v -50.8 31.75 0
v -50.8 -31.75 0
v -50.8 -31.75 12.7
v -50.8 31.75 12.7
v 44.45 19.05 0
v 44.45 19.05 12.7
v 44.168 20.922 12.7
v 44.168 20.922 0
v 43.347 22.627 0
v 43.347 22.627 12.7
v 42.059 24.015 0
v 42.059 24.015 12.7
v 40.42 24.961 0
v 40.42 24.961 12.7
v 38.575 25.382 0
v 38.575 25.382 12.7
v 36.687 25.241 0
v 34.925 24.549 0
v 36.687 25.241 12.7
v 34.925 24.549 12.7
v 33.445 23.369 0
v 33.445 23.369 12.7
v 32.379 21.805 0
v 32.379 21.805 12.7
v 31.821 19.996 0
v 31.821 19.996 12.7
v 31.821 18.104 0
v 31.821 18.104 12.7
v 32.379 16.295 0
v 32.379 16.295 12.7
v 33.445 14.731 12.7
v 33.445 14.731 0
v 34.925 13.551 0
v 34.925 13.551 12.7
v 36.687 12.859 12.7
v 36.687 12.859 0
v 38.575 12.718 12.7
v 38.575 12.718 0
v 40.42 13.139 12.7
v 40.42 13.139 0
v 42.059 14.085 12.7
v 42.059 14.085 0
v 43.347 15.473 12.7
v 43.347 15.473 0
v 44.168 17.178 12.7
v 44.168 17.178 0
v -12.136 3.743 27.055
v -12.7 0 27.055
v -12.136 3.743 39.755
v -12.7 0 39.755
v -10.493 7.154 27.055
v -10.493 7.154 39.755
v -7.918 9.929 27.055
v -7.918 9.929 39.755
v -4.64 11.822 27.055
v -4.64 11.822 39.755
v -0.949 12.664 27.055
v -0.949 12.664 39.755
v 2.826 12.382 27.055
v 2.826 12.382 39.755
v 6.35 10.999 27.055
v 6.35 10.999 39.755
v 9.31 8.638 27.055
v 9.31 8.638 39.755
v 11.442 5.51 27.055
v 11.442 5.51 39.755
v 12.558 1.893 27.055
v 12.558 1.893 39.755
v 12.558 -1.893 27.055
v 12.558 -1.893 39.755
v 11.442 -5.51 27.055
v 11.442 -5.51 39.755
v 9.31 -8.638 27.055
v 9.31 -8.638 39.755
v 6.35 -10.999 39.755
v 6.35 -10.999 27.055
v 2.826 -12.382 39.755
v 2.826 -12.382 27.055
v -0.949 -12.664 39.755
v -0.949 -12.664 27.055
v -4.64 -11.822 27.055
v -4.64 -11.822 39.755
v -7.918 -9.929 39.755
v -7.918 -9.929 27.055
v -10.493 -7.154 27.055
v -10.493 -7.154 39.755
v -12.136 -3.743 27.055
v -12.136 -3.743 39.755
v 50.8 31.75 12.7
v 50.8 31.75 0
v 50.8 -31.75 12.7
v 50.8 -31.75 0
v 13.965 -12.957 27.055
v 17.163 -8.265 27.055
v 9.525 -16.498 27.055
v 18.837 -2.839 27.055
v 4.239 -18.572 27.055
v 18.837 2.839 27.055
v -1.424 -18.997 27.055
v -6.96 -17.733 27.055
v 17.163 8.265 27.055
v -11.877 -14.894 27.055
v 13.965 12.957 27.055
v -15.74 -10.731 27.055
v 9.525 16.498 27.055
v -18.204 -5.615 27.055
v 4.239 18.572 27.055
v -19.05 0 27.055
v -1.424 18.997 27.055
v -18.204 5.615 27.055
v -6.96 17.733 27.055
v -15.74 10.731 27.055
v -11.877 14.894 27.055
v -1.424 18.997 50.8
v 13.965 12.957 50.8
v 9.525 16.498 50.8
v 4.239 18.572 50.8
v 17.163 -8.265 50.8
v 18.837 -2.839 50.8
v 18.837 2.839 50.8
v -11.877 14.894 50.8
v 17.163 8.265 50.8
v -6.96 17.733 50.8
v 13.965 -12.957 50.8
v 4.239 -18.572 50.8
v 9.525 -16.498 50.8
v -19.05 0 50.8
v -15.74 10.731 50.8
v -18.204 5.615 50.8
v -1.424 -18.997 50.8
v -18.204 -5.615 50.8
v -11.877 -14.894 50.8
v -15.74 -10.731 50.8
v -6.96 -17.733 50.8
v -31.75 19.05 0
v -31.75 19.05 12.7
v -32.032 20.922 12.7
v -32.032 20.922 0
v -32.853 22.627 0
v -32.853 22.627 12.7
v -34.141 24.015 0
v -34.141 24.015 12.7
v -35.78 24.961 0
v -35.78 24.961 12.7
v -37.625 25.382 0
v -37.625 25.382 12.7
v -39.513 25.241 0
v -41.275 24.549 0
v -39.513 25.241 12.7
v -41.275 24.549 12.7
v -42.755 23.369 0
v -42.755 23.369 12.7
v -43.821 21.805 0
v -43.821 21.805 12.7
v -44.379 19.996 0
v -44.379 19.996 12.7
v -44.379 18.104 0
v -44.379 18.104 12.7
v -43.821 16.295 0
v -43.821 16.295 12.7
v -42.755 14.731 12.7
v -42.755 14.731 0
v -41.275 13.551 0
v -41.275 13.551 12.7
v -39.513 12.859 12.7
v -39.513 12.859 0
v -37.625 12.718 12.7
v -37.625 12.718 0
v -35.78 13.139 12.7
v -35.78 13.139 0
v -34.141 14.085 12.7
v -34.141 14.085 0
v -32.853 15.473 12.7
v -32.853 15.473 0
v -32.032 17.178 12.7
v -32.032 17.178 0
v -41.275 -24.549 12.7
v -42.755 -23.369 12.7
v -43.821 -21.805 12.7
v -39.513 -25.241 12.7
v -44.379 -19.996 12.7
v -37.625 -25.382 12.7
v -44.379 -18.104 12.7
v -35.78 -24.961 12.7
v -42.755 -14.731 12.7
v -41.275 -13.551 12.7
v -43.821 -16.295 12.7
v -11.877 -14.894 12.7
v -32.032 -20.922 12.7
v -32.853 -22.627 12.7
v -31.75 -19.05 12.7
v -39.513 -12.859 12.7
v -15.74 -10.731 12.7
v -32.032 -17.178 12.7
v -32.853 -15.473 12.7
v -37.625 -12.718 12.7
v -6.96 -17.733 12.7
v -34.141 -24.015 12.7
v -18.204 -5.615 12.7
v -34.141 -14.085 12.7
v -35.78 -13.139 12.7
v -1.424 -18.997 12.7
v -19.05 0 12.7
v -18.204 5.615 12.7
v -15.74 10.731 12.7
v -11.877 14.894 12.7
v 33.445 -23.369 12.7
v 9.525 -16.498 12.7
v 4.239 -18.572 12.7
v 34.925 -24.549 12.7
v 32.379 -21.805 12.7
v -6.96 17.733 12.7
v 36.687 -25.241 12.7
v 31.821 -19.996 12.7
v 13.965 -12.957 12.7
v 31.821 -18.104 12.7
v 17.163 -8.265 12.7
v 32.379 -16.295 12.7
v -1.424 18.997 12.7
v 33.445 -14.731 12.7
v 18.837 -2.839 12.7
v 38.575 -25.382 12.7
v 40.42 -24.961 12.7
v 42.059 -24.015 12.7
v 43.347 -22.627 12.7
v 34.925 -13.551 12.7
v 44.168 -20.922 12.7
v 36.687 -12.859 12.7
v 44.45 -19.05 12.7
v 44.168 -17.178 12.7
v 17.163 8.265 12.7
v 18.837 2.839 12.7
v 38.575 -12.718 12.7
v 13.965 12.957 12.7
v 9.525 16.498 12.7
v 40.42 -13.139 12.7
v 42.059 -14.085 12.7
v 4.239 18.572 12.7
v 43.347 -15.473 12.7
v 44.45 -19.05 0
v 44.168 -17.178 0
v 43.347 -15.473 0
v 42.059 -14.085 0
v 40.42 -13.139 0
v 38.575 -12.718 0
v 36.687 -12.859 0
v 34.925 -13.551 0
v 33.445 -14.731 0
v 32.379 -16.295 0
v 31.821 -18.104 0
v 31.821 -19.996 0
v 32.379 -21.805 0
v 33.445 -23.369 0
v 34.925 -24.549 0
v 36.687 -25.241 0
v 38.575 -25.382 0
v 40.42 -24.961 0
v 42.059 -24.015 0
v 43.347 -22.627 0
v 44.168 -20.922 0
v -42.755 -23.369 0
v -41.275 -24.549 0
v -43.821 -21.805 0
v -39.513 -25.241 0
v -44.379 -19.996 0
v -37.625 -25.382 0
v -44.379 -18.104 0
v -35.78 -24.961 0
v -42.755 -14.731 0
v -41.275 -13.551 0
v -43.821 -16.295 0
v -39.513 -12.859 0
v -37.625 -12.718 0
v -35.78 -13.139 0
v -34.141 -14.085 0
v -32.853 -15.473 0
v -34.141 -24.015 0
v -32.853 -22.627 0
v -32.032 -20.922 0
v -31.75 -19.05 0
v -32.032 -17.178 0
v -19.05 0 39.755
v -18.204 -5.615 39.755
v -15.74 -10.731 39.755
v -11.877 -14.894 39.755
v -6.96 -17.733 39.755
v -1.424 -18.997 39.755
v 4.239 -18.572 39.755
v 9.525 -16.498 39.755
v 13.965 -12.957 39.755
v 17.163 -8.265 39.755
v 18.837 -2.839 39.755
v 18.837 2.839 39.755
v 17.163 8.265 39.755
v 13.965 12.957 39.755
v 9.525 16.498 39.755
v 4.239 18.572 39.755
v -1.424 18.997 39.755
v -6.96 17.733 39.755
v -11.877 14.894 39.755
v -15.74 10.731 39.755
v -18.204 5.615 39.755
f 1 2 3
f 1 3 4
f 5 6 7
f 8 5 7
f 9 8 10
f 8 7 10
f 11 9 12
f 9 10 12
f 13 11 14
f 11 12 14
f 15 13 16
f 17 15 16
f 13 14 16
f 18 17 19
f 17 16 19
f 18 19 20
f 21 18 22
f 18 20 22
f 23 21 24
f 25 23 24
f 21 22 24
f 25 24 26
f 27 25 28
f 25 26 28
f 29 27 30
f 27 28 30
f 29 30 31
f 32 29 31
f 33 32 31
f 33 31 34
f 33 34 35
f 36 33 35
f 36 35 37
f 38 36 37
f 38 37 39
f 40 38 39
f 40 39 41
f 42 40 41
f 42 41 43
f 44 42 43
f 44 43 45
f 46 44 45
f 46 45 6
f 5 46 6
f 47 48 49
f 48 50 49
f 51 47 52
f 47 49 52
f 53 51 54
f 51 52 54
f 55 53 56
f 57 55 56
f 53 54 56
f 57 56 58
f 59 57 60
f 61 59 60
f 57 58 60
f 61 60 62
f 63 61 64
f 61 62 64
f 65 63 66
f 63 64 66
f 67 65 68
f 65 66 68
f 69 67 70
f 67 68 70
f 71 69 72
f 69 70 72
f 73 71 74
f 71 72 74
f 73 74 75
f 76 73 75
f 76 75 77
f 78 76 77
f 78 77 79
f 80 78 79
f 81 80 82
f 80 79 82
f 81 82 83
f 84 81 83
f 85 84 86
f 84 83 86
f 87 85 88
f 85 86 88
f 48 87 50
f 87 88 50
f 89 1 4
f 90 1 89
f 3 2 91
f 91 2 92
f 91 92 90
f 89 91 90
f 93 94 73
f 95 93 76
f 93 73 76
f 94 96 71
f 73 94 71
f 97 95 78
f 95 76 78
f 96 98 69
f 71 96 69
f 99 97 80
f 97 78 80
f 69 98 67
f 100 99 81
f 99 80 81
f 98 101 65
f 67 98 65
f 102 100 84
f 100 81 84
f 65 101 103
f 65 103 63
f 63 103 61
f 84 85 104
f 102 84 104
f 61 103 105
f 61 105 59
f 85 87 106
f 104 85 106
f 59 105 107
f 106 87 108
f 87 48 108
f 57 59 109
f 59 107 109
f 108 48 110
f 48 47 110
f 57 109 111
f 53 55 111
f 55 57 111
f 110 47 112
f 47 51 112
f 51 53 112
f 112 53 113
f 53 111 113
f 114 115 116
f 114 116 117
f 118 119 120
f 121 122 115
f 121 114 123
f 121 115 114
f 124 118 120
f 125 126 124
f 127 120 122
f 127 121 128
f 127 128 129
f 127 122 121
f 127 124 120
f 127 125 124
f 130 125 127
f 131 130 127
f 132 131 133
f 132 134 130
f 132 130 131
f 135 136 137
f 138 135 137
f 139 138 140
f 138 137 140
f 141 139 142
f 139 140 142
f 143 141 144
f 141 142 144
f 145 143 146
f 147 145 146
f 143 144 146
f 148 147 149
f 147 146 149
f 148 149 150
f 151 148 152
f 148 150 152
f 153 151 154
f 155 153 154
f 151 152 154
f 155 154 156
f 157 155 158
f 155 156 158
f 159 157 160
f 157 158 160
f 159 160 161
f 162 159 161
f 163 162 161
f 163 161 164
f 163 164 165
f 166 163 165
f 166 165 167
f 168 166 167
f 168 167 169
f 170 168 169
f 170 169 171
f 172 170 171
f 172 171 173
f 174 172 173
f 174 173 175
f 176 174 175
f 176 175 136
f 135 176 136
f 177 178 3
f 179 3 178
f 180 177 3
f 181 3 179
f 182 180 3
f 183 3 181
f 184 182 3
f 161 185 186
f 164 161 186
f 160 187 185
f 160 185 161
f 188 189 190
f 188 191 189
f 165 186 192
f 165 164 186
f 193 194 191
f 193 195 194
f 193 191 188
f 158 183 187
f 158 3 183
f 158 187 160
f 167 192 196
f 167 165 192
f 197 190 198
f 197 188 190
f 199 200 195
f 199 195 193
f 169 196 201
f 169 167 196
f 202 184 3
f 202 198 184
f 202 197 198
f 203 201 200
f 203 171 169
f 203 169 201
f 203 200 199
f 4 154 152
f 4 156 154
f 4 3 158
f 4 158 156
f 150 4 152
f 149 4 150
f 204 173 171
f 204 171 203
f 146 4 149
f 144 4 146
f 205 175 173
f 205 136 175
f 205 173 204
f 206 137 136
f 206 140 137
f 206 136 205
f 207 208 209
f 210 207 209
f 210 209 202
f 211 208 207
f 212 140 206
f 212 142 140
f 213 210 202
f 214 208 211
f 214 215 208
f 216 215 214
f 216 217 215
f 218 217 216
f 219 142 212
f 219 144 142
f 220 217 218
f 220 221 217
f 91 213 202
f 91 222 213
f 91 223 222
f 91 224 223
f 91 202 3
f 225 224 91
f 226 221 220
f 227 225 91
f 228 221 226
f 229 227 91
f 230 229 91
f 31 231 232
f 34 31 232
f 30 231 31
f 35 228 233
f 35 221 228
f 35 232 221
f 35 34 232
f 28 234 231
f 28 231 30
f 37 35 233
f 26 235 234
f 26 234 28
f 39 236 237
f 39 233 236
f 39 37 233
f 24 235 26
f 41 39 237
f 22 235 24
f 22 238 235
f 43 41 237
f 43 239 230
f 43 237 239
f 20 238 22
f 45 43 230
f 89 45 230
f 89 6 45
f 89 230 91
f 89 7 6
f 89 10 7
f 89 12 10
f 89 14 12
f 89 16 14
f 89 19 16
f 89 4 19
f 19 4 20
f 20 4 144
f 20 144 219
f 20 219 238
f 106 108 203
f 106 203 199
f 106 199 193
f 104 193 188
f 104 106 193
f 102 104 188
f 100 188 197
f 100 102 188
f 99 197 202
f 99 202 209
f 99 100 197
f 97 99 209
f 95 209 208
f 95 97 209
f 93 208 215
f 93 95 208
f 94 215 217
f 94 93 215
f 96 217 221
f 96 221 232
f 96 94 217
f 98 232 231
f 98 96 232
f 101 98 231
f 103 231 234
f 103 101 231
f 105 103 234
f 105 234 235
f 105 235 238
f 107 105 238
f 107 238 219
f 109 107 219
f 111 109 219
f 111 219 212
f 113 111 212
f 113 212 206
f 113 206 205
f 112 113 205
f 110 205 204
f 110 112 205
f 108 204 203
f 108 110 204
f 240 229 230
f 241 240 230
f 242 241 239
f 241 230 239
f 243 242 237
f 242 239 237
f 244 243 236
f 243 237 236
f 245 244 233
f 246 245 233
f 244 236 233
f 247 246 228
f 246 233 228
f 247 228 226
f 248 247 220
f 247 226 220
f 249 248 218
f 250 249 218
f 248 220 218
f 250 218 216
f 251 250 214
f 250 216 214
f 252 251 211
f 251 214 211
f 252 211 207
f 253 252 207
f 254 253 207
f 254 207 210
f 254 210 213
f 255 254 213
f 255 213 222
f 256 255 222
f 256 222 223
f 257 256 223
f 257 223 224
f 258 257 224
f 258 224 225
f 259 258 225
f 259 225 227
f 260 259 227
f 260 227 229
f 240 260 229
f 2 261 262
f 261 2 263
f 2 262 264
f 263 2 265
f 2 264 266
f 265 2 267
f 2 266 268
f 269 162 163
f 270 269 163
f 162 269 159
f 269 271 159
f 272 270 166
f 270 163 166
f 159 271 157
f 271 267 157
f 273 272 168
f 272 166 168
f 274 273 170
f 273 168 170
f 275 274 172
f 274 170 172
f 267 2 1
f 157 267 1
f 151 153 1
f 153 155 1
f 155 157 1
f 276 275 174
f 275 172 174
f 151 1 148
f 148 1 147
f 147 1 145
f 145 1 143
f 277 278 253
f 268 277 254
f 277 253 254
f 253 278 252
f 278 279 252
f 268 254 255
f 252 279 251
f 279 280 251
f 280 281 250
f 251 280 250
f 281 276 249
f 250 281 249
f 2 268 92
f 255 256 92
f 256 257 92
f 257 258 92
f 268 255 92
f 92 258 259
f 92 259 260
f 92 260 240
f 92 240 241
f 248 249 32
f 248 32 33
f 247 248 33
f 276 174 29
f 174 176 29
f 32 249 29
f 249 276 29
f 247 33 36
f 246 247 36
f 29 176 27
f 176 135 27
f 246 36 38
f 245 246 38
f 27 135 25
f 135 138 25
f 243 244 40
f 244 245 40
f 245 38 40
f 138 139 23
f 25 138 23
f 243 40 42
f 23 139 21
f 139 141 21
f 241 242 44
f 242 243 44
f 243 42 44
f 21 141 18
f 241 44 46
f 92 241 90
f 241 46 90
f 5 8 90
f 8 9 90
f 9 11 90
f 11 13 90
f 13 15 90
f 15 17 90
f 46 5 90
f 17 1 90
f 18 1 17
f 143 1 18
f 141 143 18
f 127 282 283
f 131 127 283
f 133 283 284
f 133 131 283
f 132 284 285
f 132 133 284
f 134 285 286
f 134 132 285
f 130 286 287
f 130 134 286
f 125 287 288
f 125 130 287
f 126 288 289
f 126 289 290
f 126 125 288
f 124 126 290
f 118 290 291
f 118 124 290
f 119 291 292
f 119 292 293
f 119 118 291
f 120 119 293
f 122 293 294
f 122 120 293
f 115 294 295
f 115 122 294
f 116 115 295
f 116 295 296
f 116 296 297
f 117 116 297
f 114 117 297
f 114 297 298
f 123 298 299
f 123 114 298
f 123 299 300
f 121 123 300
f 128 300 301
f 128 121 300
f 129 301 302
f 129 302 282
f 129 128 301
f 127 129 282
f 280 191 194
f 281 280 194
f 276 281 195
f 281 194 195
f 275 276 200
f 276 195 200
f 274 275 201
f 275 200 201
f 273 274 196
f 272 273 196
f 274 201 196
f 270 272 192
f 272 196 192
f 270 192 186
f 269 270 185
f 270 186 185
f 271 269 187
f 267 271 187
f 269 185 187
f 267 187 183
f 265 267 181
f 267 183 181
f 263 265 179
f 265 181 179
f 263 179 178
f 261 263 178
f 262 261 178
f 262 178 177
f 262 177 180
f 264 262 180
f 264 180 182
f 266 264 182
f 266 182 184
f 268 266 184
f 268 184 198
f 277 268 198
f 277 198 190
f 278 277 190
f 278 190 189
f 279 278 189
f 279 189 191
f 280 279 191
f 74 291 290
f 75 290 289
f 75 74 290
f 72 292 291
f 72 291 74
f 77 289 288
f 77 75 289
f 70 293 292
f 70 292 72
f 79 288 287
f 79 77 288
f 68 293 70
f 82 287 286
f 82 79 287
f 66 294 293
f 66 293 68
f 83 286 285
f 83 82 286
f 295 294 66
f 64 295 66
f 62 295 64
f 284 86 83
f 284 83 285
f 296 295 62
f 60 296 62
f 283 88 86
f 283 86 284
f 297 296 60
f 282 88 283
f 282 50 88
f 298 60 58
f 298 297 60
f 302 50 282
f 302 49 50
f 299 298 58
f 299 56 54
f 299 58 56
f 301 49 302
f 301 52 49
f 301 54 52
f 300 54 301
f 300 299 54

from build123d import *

# Parameters (mm, degrees)
F0_W     = 101.6
F0_H     = 63.5
F1_DEPTH = 12.7
F2_R     = 6.35
F3_DEPTH = 25.4
F4_W     = 19.05
F4_H     = 38.1
F6_W     = 12.7
F6_H     = 12.7


with BuildPart() as f1:
    # F0 (on Top) → F1 (new body)
    with BuildSketch(Plane.XY):
        Rectangle(F0_W, F0_H)
    extrude(amount=F1_DEPTH)

    # F2 (on face) → F3 (cut)
    with BuildSketch(Plane.XY.offset(12.7)):
        with Locations((-38.1, 19.05)):
            Circle(F2_R)
        with Locations((-38.1, -19.05)):
            Circle(F2_R)
        with Locations((38.1, -19.05)):
            Circle(F2_R)
        with Locations((38.1, 19.05)):
            Circle(F2_R)
    extrude(amount=-F3_DEPTH, mode=Mode.SUBTRACT)

    # F4 (on Front) → F5 (revolve)
    with BuildSketch(Plane.XZ):
        with Locations((-9.525, 31.75)):
            Rectangle(F4_W, F4_H)
    revolve(axis=Axis((0, 0, 31.75), (0, 0, 1)))

    # F6 (on Front) → F7 (revolve, cut)
    with BuildSketch(Plane.XZ):
        with Locations((-19.05, 33.404847)):
            Rectangle(F6_W, F6_H)
    revolve(axis=Axis((0, 0, 21.012729), (0, 0, -1)), mode=Mode.SUBTRACT)


solid = f1.part
